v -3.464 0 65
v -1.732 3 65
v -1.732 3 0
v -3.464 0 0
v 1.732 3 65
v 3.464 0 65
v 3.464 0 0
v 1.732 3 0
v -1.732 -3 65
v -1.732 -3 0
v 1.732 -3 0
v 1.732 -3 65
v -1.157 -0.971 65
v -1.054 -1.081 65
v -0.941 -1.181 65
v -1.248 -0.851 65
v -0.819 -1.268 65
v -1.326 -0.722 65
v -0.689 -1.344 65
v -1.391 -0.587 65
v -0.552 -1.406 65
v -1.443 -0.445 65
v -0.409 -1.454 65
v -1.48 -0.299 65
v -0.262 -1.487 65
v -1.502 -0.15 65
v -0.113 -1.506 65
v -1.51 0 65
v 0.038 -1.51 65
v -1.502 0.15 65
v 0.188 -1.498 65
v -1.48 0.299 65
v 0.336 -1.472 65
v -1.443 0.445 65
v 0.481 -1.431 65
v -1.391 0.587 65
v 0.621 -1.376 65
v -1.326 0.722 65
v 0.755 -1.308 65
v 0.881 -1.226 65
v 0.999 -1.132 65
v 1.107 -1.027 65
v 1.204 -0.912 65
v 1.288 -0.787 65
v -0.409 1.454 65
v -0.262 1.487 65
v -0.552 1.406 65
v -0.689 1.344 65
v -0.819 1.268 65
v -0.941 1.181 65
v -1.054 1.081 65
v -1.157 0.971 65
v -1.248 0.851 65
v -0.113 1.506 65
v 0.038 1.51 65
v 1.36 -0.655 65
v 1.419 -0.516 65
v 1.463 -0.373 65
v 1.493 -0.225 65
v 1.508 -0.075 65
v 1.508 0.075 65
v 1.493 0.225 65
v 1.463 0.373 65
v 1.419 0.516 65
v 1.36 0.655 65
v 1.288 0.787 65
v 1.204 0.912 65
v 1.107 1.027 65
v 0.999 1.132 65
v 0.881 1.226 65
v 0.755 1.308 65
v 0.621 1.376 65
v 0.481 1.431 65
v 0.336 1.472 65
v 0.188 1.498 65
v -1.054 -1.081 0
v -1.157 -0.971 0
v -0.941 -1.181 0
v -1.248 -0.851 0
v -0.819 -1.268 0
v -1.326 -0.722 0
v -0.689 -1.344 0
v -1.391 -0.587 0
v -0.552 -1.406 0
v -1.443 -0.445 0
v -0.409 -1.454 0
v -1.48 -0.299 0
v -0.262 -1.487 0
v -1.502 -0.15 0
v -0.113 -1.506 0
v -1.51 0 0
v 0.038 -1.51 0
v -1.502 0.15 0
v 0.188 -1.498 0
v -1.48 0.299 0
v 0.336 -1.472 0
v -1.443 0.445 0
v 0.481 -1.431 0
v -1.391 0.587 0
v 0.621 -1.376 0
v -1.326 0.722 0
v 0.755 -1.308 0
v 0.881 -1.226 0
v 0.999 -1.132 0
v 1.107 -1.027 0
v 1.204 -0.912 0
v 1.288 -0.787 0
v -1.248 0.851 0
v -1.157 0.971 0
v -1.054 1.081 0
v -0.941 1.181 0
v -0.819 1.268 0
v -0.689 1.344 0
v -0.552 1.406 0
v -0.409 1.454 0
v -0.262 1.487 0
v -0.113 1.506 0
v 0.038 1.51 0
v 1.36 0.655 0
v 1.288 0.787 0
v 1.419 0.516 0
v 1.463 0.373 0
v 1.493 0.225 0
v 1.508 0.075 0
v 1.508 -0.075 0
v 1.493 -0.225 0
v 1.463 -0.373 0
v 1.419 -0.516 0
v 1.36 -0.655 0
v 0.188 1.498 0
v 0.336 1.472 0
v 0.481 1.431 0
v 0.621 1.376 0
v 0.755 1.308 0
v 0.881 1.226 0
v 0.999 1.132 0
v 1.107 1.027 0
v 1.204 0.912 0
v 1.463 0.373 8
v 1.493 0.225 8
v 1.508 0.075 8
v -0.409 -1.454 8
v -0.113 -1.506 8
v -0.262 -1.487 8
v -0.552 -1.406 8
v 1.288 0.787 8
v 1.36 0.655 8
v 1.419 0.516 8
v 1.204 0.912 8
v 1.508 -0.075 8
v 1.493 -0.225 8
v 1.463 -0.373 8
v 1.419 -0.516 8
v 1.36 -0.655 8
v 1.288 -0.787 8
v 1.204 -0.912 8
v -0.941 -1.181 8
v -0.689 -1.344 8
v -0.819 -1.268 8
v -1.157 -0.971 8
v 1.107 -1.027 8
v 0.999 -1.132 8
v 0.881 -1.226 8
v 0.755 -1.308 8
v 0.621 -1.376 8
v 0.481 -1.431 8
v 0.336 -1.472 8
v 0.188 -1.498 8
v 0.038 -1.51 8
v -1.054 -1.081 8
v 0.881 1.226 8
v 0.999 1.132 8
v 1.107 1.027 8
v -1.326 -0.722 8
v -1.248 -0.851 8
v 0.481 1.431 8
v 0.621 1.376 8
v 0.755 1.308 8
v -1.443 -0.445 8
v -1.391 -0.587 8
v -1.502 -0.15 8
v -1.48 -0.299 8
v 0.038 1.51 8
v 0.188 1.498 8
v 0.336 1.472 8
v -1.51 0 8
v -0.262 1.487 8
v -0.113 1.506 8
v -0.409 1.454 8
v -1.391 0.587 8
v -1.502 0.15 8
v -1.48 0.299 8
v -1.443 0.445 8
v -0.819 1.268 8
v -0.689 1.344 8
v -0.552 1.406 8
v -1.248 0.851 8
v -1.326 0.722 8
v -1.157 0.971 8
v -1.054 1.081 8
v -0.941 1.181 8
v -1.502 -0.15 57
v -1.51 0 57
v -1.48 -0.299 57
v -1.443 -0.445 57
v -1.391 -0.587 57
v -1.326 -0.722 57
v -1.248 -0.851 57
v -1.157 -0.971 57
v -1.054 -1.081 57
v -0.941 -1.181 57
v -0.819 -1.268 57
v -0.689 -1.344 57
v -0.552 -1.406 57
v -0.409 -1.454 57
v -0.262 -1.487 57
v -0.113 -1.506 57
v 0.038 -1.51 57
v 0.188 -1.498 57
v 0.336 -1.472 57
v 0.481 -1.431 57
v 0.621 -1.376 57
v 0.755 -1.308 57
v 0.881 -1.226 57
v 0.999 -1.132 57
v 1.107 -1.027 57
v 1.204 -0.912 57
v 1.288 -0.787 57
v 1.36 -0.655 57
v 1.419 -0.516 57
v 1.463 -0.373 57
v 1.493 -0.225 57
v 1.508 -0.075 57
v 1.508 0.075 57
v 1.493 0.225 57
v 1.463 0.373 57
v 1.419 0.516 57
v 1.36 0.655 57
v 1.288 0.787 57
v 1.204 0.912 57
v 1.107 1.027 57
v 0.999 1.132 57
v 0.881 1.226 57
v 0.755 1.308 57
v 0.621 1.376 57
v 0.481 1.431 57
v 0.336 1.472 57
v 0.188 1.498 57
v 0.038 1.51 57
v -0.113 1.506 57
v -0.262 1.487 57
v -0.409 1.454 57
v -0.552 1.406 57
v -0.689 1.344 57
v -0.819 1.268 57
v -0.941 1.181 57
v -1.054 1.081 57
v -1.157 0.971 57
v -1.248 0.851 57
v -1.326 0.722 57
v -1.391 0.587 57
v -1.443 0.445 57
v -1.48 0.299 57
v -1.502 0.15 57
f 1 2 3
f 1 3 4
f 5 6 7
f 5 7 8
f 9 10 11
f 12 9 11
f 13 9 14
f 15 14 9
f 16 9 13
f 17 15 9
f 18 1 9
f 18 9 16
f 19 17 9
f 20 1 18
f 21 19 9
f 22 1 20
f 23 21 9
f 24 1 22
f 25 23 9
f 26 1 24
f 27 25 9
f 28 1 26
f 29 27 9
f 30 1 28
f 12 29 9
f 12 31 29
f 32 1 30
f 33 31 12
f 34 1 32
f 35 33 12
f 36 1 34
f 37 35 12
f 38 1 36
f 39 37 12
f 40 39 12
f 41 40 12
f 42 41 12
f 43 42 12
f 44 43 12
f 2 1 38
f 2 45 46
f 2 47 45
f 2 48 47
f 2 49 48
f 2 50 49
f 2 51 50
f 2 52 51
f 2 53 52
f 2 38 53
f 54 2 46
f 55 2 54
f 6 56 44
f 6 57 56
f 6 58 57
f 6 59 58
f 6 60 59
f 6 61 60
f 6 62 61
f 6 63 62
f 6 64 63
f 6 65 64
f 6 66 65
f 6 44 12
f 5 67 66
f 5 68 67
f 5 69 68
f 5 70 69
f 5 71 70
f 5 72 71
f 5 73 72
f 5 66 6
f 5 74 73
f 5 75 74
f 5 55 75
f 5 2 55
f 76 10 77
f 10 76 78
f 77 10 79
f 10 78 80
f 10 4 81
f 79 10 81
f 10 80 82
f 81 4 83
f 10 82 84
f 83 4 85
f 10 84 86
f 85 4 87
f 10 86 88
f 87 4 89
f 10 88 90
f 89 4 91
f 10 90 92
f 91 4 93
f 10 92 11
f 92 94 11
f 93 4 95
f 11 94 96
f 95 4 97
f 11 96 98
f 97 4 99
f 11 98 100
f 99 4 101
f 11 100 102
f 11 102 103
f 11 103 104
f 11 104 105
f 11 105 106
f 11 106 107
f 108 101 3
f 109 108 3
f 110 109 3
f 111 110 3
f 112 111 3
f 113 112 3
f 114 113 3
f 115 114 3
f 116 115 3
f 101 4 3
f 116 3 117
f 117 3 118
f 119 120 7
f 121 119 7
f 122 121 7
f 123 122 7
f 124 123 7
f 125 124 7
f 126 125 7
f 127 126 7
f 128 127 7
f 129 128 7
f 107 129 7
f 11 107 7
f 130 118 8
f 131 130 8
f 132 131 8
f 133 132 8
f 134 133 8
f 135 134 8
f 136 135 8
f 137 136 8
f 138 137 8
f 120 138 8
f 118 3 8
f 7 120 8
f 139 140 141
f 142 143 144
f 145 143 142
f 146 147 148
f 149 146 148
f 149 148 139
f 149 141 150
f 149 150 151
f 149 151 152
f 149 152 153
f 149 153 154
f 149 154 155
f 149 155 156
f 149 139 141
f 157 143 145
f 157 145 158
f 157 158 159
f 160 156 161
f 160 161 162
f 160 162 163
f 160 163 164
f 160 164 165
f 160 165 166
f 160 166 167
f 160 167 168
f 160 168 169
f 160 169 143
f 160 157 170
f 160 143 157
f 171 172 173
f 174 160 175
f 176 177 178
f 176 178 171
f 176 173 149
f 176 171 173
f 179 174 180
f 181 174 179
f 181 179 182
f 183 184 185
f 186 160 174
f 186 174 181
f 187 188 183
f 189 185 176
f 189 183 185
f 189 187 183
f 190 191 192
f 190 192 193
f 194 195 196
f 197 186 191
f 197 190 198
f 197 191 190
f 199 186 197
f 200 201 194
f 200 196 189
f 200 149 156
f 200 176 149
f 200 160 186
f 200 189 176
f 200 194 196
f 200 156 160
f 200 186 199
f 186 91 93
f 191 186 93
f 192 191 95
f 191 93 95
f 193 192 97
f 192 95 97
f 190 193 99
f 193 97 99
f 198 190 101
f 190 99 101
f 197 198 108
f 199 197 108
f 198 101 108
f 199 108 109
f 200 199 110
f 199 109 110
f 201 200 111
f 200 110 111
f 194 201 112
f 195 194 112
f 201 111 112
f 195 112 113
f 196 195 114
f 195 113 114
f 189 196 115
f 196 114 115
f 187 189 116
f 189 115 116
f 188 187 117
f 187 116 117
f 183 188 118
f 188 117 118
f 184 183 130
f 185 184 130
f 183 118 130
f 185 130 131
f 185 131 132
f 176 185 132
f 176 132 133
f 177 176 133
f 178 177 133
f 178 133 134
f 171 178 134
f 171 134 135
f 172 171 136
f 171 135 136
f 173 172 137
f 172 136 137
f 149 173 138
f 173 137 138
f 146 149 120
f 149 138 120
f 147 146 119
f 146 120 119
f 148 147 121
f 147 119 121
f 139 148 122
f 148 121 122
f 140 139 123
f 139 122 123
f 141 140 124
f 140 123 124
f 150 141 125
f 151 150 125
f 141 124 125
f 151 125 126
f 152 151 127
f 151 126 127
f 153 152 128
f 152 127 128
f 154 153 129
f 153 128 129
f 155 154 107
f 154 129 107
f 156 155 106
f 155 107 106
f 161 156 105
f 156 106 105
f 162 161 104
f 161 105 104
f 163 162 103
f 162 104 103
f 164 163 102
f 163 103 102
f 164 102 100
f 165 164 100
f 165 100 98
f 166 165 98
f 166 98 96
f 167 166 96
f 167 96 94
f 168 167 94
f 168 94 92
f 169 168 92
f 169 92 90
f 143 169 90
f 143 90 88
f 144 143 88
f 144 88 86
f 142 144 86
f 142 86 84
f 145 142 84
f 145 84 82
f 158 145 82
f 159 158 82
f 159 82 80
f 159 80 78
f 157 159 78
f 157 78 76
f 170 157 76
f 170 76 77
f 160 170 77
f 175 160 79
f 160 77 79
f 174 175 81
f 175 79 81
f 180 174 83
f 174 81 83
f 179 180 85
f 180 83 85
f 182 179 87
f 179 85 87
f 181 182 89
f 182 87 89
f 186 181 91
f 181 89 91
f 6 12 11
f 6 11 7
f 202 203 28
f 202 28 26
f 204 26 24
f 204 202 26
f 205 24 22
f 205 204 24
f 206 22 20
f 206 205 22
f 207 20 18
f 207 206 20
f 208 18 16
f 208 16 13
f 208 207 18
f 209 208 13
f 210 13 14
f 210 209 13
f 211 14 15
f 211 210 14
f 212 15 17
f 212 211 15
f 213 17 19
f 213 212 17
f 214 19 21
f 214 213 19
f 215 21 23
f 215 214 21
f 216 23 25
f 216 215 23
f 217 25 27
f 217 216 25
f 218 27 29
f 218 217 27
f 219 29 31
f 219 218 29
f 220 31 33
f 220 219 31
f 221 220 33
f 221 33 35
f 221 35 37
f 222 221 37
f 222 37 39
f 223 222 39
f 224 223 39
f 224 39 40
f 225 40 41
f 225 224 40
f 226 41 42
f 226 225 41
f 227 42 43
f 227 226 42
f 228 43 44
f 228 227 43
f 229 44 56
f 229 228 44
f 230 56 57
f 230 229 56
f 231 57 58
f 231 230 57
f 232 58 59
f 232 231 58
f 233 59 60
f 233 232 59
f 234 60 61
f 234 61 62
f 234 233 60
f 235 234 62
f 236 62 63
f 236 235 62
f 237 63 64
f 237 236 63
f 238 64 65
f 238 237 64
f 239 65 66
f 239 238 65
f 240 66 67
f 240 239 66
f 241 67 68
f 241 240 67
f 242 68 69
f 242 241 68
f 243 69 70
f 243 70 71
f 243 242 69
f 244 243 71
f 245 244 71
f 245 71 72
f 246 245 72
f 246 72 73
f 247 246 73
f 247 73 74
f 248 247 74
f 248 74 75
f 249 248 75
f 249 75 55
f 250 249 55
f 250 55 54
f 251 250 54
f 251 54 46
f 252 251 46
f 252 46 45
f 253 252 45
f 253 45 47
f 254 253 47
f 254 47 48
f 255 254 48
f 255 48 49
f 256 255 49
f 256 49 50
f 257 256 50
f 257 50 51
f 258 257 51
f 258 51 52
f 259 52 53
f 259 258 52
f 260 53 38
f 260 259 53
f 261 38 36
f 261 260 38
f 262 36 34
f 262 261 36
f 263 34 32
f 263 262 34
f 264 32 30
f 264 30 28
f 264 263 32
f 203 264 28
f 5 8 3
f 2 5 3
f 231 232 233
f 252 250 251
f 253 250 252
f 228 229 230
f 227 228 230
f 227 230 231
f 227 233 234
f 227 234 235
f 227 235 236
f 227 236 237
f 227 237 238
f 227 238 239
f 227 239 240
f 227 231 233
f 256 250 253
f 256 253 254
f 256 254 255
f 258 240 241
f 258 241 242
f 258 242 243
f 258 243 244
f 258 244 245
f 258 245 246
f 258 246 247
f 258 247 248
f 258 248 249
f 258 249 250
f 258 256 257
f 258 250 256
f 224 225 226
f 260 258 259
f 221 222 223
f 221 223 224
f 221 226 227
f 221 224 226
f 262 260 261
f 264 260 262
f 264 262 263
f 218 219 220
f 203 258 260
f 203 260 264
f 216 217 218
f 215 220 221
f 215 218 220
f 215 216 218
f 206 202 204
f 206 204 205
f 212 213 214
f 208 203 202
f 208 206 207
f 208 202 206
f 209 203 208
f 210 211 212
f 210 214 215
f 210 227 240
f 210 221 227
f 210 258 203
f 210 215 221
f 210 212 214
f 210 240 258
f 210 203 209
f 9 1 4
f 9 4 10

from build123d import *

# Parameters (mm, degrees)
F_70MM_DEPTH           = 65
SKETCH_M3_R            = 1.51
CUT_EXTRUDE_M3_DEPTH   = 8
CUT_EXTRUDE_START      = -8
SKETCH_M3_2_R          = 1.51
CUT_EXTRUDE_M3_2_DEPTH = 8


with BuildPart() as part:
    # Sketch 185 → 隔柱高度_70mm (new body)
    with BuildSketch(Plane.XY):
        Polygon((3.464101615, 0), (1.732050808, 3), (-1.732050808, 3), (-3.464101615, 0), (-1.732050808, -3), (1.732050808, -3), align=None)
    extrude(amount=F_70MM_DEPTH)

    # Sketch M3 → Cut-Extrude M3 (cut)
    with BuildSketch(Plane(origin=(0, 0, 0), x_dir=(-1, 0, 0), z_dir=(0, 0, -1))):
        Circle(SKETCH_M3_R)
    extrude(amount=-CUT_EXTRUDE_M3_DEPTH, mode=Mode.SUBTRACT)

    # Sketch M3 2 → Cut-Extrude M3 2 (cut)
    with BuildSketch(Plane.XY.offset(65).offset(CUT_EXTRUDE_START)):
        with Locations(Location((0, 0, 0), (0, 0, 180))):
            Circle(SKETCH_M3_2_R)
    extrude(amount=CUT_EXTRUDE_M3_2_DEPTH, mode=Mode.SUBTRACT)


solid = part.part
